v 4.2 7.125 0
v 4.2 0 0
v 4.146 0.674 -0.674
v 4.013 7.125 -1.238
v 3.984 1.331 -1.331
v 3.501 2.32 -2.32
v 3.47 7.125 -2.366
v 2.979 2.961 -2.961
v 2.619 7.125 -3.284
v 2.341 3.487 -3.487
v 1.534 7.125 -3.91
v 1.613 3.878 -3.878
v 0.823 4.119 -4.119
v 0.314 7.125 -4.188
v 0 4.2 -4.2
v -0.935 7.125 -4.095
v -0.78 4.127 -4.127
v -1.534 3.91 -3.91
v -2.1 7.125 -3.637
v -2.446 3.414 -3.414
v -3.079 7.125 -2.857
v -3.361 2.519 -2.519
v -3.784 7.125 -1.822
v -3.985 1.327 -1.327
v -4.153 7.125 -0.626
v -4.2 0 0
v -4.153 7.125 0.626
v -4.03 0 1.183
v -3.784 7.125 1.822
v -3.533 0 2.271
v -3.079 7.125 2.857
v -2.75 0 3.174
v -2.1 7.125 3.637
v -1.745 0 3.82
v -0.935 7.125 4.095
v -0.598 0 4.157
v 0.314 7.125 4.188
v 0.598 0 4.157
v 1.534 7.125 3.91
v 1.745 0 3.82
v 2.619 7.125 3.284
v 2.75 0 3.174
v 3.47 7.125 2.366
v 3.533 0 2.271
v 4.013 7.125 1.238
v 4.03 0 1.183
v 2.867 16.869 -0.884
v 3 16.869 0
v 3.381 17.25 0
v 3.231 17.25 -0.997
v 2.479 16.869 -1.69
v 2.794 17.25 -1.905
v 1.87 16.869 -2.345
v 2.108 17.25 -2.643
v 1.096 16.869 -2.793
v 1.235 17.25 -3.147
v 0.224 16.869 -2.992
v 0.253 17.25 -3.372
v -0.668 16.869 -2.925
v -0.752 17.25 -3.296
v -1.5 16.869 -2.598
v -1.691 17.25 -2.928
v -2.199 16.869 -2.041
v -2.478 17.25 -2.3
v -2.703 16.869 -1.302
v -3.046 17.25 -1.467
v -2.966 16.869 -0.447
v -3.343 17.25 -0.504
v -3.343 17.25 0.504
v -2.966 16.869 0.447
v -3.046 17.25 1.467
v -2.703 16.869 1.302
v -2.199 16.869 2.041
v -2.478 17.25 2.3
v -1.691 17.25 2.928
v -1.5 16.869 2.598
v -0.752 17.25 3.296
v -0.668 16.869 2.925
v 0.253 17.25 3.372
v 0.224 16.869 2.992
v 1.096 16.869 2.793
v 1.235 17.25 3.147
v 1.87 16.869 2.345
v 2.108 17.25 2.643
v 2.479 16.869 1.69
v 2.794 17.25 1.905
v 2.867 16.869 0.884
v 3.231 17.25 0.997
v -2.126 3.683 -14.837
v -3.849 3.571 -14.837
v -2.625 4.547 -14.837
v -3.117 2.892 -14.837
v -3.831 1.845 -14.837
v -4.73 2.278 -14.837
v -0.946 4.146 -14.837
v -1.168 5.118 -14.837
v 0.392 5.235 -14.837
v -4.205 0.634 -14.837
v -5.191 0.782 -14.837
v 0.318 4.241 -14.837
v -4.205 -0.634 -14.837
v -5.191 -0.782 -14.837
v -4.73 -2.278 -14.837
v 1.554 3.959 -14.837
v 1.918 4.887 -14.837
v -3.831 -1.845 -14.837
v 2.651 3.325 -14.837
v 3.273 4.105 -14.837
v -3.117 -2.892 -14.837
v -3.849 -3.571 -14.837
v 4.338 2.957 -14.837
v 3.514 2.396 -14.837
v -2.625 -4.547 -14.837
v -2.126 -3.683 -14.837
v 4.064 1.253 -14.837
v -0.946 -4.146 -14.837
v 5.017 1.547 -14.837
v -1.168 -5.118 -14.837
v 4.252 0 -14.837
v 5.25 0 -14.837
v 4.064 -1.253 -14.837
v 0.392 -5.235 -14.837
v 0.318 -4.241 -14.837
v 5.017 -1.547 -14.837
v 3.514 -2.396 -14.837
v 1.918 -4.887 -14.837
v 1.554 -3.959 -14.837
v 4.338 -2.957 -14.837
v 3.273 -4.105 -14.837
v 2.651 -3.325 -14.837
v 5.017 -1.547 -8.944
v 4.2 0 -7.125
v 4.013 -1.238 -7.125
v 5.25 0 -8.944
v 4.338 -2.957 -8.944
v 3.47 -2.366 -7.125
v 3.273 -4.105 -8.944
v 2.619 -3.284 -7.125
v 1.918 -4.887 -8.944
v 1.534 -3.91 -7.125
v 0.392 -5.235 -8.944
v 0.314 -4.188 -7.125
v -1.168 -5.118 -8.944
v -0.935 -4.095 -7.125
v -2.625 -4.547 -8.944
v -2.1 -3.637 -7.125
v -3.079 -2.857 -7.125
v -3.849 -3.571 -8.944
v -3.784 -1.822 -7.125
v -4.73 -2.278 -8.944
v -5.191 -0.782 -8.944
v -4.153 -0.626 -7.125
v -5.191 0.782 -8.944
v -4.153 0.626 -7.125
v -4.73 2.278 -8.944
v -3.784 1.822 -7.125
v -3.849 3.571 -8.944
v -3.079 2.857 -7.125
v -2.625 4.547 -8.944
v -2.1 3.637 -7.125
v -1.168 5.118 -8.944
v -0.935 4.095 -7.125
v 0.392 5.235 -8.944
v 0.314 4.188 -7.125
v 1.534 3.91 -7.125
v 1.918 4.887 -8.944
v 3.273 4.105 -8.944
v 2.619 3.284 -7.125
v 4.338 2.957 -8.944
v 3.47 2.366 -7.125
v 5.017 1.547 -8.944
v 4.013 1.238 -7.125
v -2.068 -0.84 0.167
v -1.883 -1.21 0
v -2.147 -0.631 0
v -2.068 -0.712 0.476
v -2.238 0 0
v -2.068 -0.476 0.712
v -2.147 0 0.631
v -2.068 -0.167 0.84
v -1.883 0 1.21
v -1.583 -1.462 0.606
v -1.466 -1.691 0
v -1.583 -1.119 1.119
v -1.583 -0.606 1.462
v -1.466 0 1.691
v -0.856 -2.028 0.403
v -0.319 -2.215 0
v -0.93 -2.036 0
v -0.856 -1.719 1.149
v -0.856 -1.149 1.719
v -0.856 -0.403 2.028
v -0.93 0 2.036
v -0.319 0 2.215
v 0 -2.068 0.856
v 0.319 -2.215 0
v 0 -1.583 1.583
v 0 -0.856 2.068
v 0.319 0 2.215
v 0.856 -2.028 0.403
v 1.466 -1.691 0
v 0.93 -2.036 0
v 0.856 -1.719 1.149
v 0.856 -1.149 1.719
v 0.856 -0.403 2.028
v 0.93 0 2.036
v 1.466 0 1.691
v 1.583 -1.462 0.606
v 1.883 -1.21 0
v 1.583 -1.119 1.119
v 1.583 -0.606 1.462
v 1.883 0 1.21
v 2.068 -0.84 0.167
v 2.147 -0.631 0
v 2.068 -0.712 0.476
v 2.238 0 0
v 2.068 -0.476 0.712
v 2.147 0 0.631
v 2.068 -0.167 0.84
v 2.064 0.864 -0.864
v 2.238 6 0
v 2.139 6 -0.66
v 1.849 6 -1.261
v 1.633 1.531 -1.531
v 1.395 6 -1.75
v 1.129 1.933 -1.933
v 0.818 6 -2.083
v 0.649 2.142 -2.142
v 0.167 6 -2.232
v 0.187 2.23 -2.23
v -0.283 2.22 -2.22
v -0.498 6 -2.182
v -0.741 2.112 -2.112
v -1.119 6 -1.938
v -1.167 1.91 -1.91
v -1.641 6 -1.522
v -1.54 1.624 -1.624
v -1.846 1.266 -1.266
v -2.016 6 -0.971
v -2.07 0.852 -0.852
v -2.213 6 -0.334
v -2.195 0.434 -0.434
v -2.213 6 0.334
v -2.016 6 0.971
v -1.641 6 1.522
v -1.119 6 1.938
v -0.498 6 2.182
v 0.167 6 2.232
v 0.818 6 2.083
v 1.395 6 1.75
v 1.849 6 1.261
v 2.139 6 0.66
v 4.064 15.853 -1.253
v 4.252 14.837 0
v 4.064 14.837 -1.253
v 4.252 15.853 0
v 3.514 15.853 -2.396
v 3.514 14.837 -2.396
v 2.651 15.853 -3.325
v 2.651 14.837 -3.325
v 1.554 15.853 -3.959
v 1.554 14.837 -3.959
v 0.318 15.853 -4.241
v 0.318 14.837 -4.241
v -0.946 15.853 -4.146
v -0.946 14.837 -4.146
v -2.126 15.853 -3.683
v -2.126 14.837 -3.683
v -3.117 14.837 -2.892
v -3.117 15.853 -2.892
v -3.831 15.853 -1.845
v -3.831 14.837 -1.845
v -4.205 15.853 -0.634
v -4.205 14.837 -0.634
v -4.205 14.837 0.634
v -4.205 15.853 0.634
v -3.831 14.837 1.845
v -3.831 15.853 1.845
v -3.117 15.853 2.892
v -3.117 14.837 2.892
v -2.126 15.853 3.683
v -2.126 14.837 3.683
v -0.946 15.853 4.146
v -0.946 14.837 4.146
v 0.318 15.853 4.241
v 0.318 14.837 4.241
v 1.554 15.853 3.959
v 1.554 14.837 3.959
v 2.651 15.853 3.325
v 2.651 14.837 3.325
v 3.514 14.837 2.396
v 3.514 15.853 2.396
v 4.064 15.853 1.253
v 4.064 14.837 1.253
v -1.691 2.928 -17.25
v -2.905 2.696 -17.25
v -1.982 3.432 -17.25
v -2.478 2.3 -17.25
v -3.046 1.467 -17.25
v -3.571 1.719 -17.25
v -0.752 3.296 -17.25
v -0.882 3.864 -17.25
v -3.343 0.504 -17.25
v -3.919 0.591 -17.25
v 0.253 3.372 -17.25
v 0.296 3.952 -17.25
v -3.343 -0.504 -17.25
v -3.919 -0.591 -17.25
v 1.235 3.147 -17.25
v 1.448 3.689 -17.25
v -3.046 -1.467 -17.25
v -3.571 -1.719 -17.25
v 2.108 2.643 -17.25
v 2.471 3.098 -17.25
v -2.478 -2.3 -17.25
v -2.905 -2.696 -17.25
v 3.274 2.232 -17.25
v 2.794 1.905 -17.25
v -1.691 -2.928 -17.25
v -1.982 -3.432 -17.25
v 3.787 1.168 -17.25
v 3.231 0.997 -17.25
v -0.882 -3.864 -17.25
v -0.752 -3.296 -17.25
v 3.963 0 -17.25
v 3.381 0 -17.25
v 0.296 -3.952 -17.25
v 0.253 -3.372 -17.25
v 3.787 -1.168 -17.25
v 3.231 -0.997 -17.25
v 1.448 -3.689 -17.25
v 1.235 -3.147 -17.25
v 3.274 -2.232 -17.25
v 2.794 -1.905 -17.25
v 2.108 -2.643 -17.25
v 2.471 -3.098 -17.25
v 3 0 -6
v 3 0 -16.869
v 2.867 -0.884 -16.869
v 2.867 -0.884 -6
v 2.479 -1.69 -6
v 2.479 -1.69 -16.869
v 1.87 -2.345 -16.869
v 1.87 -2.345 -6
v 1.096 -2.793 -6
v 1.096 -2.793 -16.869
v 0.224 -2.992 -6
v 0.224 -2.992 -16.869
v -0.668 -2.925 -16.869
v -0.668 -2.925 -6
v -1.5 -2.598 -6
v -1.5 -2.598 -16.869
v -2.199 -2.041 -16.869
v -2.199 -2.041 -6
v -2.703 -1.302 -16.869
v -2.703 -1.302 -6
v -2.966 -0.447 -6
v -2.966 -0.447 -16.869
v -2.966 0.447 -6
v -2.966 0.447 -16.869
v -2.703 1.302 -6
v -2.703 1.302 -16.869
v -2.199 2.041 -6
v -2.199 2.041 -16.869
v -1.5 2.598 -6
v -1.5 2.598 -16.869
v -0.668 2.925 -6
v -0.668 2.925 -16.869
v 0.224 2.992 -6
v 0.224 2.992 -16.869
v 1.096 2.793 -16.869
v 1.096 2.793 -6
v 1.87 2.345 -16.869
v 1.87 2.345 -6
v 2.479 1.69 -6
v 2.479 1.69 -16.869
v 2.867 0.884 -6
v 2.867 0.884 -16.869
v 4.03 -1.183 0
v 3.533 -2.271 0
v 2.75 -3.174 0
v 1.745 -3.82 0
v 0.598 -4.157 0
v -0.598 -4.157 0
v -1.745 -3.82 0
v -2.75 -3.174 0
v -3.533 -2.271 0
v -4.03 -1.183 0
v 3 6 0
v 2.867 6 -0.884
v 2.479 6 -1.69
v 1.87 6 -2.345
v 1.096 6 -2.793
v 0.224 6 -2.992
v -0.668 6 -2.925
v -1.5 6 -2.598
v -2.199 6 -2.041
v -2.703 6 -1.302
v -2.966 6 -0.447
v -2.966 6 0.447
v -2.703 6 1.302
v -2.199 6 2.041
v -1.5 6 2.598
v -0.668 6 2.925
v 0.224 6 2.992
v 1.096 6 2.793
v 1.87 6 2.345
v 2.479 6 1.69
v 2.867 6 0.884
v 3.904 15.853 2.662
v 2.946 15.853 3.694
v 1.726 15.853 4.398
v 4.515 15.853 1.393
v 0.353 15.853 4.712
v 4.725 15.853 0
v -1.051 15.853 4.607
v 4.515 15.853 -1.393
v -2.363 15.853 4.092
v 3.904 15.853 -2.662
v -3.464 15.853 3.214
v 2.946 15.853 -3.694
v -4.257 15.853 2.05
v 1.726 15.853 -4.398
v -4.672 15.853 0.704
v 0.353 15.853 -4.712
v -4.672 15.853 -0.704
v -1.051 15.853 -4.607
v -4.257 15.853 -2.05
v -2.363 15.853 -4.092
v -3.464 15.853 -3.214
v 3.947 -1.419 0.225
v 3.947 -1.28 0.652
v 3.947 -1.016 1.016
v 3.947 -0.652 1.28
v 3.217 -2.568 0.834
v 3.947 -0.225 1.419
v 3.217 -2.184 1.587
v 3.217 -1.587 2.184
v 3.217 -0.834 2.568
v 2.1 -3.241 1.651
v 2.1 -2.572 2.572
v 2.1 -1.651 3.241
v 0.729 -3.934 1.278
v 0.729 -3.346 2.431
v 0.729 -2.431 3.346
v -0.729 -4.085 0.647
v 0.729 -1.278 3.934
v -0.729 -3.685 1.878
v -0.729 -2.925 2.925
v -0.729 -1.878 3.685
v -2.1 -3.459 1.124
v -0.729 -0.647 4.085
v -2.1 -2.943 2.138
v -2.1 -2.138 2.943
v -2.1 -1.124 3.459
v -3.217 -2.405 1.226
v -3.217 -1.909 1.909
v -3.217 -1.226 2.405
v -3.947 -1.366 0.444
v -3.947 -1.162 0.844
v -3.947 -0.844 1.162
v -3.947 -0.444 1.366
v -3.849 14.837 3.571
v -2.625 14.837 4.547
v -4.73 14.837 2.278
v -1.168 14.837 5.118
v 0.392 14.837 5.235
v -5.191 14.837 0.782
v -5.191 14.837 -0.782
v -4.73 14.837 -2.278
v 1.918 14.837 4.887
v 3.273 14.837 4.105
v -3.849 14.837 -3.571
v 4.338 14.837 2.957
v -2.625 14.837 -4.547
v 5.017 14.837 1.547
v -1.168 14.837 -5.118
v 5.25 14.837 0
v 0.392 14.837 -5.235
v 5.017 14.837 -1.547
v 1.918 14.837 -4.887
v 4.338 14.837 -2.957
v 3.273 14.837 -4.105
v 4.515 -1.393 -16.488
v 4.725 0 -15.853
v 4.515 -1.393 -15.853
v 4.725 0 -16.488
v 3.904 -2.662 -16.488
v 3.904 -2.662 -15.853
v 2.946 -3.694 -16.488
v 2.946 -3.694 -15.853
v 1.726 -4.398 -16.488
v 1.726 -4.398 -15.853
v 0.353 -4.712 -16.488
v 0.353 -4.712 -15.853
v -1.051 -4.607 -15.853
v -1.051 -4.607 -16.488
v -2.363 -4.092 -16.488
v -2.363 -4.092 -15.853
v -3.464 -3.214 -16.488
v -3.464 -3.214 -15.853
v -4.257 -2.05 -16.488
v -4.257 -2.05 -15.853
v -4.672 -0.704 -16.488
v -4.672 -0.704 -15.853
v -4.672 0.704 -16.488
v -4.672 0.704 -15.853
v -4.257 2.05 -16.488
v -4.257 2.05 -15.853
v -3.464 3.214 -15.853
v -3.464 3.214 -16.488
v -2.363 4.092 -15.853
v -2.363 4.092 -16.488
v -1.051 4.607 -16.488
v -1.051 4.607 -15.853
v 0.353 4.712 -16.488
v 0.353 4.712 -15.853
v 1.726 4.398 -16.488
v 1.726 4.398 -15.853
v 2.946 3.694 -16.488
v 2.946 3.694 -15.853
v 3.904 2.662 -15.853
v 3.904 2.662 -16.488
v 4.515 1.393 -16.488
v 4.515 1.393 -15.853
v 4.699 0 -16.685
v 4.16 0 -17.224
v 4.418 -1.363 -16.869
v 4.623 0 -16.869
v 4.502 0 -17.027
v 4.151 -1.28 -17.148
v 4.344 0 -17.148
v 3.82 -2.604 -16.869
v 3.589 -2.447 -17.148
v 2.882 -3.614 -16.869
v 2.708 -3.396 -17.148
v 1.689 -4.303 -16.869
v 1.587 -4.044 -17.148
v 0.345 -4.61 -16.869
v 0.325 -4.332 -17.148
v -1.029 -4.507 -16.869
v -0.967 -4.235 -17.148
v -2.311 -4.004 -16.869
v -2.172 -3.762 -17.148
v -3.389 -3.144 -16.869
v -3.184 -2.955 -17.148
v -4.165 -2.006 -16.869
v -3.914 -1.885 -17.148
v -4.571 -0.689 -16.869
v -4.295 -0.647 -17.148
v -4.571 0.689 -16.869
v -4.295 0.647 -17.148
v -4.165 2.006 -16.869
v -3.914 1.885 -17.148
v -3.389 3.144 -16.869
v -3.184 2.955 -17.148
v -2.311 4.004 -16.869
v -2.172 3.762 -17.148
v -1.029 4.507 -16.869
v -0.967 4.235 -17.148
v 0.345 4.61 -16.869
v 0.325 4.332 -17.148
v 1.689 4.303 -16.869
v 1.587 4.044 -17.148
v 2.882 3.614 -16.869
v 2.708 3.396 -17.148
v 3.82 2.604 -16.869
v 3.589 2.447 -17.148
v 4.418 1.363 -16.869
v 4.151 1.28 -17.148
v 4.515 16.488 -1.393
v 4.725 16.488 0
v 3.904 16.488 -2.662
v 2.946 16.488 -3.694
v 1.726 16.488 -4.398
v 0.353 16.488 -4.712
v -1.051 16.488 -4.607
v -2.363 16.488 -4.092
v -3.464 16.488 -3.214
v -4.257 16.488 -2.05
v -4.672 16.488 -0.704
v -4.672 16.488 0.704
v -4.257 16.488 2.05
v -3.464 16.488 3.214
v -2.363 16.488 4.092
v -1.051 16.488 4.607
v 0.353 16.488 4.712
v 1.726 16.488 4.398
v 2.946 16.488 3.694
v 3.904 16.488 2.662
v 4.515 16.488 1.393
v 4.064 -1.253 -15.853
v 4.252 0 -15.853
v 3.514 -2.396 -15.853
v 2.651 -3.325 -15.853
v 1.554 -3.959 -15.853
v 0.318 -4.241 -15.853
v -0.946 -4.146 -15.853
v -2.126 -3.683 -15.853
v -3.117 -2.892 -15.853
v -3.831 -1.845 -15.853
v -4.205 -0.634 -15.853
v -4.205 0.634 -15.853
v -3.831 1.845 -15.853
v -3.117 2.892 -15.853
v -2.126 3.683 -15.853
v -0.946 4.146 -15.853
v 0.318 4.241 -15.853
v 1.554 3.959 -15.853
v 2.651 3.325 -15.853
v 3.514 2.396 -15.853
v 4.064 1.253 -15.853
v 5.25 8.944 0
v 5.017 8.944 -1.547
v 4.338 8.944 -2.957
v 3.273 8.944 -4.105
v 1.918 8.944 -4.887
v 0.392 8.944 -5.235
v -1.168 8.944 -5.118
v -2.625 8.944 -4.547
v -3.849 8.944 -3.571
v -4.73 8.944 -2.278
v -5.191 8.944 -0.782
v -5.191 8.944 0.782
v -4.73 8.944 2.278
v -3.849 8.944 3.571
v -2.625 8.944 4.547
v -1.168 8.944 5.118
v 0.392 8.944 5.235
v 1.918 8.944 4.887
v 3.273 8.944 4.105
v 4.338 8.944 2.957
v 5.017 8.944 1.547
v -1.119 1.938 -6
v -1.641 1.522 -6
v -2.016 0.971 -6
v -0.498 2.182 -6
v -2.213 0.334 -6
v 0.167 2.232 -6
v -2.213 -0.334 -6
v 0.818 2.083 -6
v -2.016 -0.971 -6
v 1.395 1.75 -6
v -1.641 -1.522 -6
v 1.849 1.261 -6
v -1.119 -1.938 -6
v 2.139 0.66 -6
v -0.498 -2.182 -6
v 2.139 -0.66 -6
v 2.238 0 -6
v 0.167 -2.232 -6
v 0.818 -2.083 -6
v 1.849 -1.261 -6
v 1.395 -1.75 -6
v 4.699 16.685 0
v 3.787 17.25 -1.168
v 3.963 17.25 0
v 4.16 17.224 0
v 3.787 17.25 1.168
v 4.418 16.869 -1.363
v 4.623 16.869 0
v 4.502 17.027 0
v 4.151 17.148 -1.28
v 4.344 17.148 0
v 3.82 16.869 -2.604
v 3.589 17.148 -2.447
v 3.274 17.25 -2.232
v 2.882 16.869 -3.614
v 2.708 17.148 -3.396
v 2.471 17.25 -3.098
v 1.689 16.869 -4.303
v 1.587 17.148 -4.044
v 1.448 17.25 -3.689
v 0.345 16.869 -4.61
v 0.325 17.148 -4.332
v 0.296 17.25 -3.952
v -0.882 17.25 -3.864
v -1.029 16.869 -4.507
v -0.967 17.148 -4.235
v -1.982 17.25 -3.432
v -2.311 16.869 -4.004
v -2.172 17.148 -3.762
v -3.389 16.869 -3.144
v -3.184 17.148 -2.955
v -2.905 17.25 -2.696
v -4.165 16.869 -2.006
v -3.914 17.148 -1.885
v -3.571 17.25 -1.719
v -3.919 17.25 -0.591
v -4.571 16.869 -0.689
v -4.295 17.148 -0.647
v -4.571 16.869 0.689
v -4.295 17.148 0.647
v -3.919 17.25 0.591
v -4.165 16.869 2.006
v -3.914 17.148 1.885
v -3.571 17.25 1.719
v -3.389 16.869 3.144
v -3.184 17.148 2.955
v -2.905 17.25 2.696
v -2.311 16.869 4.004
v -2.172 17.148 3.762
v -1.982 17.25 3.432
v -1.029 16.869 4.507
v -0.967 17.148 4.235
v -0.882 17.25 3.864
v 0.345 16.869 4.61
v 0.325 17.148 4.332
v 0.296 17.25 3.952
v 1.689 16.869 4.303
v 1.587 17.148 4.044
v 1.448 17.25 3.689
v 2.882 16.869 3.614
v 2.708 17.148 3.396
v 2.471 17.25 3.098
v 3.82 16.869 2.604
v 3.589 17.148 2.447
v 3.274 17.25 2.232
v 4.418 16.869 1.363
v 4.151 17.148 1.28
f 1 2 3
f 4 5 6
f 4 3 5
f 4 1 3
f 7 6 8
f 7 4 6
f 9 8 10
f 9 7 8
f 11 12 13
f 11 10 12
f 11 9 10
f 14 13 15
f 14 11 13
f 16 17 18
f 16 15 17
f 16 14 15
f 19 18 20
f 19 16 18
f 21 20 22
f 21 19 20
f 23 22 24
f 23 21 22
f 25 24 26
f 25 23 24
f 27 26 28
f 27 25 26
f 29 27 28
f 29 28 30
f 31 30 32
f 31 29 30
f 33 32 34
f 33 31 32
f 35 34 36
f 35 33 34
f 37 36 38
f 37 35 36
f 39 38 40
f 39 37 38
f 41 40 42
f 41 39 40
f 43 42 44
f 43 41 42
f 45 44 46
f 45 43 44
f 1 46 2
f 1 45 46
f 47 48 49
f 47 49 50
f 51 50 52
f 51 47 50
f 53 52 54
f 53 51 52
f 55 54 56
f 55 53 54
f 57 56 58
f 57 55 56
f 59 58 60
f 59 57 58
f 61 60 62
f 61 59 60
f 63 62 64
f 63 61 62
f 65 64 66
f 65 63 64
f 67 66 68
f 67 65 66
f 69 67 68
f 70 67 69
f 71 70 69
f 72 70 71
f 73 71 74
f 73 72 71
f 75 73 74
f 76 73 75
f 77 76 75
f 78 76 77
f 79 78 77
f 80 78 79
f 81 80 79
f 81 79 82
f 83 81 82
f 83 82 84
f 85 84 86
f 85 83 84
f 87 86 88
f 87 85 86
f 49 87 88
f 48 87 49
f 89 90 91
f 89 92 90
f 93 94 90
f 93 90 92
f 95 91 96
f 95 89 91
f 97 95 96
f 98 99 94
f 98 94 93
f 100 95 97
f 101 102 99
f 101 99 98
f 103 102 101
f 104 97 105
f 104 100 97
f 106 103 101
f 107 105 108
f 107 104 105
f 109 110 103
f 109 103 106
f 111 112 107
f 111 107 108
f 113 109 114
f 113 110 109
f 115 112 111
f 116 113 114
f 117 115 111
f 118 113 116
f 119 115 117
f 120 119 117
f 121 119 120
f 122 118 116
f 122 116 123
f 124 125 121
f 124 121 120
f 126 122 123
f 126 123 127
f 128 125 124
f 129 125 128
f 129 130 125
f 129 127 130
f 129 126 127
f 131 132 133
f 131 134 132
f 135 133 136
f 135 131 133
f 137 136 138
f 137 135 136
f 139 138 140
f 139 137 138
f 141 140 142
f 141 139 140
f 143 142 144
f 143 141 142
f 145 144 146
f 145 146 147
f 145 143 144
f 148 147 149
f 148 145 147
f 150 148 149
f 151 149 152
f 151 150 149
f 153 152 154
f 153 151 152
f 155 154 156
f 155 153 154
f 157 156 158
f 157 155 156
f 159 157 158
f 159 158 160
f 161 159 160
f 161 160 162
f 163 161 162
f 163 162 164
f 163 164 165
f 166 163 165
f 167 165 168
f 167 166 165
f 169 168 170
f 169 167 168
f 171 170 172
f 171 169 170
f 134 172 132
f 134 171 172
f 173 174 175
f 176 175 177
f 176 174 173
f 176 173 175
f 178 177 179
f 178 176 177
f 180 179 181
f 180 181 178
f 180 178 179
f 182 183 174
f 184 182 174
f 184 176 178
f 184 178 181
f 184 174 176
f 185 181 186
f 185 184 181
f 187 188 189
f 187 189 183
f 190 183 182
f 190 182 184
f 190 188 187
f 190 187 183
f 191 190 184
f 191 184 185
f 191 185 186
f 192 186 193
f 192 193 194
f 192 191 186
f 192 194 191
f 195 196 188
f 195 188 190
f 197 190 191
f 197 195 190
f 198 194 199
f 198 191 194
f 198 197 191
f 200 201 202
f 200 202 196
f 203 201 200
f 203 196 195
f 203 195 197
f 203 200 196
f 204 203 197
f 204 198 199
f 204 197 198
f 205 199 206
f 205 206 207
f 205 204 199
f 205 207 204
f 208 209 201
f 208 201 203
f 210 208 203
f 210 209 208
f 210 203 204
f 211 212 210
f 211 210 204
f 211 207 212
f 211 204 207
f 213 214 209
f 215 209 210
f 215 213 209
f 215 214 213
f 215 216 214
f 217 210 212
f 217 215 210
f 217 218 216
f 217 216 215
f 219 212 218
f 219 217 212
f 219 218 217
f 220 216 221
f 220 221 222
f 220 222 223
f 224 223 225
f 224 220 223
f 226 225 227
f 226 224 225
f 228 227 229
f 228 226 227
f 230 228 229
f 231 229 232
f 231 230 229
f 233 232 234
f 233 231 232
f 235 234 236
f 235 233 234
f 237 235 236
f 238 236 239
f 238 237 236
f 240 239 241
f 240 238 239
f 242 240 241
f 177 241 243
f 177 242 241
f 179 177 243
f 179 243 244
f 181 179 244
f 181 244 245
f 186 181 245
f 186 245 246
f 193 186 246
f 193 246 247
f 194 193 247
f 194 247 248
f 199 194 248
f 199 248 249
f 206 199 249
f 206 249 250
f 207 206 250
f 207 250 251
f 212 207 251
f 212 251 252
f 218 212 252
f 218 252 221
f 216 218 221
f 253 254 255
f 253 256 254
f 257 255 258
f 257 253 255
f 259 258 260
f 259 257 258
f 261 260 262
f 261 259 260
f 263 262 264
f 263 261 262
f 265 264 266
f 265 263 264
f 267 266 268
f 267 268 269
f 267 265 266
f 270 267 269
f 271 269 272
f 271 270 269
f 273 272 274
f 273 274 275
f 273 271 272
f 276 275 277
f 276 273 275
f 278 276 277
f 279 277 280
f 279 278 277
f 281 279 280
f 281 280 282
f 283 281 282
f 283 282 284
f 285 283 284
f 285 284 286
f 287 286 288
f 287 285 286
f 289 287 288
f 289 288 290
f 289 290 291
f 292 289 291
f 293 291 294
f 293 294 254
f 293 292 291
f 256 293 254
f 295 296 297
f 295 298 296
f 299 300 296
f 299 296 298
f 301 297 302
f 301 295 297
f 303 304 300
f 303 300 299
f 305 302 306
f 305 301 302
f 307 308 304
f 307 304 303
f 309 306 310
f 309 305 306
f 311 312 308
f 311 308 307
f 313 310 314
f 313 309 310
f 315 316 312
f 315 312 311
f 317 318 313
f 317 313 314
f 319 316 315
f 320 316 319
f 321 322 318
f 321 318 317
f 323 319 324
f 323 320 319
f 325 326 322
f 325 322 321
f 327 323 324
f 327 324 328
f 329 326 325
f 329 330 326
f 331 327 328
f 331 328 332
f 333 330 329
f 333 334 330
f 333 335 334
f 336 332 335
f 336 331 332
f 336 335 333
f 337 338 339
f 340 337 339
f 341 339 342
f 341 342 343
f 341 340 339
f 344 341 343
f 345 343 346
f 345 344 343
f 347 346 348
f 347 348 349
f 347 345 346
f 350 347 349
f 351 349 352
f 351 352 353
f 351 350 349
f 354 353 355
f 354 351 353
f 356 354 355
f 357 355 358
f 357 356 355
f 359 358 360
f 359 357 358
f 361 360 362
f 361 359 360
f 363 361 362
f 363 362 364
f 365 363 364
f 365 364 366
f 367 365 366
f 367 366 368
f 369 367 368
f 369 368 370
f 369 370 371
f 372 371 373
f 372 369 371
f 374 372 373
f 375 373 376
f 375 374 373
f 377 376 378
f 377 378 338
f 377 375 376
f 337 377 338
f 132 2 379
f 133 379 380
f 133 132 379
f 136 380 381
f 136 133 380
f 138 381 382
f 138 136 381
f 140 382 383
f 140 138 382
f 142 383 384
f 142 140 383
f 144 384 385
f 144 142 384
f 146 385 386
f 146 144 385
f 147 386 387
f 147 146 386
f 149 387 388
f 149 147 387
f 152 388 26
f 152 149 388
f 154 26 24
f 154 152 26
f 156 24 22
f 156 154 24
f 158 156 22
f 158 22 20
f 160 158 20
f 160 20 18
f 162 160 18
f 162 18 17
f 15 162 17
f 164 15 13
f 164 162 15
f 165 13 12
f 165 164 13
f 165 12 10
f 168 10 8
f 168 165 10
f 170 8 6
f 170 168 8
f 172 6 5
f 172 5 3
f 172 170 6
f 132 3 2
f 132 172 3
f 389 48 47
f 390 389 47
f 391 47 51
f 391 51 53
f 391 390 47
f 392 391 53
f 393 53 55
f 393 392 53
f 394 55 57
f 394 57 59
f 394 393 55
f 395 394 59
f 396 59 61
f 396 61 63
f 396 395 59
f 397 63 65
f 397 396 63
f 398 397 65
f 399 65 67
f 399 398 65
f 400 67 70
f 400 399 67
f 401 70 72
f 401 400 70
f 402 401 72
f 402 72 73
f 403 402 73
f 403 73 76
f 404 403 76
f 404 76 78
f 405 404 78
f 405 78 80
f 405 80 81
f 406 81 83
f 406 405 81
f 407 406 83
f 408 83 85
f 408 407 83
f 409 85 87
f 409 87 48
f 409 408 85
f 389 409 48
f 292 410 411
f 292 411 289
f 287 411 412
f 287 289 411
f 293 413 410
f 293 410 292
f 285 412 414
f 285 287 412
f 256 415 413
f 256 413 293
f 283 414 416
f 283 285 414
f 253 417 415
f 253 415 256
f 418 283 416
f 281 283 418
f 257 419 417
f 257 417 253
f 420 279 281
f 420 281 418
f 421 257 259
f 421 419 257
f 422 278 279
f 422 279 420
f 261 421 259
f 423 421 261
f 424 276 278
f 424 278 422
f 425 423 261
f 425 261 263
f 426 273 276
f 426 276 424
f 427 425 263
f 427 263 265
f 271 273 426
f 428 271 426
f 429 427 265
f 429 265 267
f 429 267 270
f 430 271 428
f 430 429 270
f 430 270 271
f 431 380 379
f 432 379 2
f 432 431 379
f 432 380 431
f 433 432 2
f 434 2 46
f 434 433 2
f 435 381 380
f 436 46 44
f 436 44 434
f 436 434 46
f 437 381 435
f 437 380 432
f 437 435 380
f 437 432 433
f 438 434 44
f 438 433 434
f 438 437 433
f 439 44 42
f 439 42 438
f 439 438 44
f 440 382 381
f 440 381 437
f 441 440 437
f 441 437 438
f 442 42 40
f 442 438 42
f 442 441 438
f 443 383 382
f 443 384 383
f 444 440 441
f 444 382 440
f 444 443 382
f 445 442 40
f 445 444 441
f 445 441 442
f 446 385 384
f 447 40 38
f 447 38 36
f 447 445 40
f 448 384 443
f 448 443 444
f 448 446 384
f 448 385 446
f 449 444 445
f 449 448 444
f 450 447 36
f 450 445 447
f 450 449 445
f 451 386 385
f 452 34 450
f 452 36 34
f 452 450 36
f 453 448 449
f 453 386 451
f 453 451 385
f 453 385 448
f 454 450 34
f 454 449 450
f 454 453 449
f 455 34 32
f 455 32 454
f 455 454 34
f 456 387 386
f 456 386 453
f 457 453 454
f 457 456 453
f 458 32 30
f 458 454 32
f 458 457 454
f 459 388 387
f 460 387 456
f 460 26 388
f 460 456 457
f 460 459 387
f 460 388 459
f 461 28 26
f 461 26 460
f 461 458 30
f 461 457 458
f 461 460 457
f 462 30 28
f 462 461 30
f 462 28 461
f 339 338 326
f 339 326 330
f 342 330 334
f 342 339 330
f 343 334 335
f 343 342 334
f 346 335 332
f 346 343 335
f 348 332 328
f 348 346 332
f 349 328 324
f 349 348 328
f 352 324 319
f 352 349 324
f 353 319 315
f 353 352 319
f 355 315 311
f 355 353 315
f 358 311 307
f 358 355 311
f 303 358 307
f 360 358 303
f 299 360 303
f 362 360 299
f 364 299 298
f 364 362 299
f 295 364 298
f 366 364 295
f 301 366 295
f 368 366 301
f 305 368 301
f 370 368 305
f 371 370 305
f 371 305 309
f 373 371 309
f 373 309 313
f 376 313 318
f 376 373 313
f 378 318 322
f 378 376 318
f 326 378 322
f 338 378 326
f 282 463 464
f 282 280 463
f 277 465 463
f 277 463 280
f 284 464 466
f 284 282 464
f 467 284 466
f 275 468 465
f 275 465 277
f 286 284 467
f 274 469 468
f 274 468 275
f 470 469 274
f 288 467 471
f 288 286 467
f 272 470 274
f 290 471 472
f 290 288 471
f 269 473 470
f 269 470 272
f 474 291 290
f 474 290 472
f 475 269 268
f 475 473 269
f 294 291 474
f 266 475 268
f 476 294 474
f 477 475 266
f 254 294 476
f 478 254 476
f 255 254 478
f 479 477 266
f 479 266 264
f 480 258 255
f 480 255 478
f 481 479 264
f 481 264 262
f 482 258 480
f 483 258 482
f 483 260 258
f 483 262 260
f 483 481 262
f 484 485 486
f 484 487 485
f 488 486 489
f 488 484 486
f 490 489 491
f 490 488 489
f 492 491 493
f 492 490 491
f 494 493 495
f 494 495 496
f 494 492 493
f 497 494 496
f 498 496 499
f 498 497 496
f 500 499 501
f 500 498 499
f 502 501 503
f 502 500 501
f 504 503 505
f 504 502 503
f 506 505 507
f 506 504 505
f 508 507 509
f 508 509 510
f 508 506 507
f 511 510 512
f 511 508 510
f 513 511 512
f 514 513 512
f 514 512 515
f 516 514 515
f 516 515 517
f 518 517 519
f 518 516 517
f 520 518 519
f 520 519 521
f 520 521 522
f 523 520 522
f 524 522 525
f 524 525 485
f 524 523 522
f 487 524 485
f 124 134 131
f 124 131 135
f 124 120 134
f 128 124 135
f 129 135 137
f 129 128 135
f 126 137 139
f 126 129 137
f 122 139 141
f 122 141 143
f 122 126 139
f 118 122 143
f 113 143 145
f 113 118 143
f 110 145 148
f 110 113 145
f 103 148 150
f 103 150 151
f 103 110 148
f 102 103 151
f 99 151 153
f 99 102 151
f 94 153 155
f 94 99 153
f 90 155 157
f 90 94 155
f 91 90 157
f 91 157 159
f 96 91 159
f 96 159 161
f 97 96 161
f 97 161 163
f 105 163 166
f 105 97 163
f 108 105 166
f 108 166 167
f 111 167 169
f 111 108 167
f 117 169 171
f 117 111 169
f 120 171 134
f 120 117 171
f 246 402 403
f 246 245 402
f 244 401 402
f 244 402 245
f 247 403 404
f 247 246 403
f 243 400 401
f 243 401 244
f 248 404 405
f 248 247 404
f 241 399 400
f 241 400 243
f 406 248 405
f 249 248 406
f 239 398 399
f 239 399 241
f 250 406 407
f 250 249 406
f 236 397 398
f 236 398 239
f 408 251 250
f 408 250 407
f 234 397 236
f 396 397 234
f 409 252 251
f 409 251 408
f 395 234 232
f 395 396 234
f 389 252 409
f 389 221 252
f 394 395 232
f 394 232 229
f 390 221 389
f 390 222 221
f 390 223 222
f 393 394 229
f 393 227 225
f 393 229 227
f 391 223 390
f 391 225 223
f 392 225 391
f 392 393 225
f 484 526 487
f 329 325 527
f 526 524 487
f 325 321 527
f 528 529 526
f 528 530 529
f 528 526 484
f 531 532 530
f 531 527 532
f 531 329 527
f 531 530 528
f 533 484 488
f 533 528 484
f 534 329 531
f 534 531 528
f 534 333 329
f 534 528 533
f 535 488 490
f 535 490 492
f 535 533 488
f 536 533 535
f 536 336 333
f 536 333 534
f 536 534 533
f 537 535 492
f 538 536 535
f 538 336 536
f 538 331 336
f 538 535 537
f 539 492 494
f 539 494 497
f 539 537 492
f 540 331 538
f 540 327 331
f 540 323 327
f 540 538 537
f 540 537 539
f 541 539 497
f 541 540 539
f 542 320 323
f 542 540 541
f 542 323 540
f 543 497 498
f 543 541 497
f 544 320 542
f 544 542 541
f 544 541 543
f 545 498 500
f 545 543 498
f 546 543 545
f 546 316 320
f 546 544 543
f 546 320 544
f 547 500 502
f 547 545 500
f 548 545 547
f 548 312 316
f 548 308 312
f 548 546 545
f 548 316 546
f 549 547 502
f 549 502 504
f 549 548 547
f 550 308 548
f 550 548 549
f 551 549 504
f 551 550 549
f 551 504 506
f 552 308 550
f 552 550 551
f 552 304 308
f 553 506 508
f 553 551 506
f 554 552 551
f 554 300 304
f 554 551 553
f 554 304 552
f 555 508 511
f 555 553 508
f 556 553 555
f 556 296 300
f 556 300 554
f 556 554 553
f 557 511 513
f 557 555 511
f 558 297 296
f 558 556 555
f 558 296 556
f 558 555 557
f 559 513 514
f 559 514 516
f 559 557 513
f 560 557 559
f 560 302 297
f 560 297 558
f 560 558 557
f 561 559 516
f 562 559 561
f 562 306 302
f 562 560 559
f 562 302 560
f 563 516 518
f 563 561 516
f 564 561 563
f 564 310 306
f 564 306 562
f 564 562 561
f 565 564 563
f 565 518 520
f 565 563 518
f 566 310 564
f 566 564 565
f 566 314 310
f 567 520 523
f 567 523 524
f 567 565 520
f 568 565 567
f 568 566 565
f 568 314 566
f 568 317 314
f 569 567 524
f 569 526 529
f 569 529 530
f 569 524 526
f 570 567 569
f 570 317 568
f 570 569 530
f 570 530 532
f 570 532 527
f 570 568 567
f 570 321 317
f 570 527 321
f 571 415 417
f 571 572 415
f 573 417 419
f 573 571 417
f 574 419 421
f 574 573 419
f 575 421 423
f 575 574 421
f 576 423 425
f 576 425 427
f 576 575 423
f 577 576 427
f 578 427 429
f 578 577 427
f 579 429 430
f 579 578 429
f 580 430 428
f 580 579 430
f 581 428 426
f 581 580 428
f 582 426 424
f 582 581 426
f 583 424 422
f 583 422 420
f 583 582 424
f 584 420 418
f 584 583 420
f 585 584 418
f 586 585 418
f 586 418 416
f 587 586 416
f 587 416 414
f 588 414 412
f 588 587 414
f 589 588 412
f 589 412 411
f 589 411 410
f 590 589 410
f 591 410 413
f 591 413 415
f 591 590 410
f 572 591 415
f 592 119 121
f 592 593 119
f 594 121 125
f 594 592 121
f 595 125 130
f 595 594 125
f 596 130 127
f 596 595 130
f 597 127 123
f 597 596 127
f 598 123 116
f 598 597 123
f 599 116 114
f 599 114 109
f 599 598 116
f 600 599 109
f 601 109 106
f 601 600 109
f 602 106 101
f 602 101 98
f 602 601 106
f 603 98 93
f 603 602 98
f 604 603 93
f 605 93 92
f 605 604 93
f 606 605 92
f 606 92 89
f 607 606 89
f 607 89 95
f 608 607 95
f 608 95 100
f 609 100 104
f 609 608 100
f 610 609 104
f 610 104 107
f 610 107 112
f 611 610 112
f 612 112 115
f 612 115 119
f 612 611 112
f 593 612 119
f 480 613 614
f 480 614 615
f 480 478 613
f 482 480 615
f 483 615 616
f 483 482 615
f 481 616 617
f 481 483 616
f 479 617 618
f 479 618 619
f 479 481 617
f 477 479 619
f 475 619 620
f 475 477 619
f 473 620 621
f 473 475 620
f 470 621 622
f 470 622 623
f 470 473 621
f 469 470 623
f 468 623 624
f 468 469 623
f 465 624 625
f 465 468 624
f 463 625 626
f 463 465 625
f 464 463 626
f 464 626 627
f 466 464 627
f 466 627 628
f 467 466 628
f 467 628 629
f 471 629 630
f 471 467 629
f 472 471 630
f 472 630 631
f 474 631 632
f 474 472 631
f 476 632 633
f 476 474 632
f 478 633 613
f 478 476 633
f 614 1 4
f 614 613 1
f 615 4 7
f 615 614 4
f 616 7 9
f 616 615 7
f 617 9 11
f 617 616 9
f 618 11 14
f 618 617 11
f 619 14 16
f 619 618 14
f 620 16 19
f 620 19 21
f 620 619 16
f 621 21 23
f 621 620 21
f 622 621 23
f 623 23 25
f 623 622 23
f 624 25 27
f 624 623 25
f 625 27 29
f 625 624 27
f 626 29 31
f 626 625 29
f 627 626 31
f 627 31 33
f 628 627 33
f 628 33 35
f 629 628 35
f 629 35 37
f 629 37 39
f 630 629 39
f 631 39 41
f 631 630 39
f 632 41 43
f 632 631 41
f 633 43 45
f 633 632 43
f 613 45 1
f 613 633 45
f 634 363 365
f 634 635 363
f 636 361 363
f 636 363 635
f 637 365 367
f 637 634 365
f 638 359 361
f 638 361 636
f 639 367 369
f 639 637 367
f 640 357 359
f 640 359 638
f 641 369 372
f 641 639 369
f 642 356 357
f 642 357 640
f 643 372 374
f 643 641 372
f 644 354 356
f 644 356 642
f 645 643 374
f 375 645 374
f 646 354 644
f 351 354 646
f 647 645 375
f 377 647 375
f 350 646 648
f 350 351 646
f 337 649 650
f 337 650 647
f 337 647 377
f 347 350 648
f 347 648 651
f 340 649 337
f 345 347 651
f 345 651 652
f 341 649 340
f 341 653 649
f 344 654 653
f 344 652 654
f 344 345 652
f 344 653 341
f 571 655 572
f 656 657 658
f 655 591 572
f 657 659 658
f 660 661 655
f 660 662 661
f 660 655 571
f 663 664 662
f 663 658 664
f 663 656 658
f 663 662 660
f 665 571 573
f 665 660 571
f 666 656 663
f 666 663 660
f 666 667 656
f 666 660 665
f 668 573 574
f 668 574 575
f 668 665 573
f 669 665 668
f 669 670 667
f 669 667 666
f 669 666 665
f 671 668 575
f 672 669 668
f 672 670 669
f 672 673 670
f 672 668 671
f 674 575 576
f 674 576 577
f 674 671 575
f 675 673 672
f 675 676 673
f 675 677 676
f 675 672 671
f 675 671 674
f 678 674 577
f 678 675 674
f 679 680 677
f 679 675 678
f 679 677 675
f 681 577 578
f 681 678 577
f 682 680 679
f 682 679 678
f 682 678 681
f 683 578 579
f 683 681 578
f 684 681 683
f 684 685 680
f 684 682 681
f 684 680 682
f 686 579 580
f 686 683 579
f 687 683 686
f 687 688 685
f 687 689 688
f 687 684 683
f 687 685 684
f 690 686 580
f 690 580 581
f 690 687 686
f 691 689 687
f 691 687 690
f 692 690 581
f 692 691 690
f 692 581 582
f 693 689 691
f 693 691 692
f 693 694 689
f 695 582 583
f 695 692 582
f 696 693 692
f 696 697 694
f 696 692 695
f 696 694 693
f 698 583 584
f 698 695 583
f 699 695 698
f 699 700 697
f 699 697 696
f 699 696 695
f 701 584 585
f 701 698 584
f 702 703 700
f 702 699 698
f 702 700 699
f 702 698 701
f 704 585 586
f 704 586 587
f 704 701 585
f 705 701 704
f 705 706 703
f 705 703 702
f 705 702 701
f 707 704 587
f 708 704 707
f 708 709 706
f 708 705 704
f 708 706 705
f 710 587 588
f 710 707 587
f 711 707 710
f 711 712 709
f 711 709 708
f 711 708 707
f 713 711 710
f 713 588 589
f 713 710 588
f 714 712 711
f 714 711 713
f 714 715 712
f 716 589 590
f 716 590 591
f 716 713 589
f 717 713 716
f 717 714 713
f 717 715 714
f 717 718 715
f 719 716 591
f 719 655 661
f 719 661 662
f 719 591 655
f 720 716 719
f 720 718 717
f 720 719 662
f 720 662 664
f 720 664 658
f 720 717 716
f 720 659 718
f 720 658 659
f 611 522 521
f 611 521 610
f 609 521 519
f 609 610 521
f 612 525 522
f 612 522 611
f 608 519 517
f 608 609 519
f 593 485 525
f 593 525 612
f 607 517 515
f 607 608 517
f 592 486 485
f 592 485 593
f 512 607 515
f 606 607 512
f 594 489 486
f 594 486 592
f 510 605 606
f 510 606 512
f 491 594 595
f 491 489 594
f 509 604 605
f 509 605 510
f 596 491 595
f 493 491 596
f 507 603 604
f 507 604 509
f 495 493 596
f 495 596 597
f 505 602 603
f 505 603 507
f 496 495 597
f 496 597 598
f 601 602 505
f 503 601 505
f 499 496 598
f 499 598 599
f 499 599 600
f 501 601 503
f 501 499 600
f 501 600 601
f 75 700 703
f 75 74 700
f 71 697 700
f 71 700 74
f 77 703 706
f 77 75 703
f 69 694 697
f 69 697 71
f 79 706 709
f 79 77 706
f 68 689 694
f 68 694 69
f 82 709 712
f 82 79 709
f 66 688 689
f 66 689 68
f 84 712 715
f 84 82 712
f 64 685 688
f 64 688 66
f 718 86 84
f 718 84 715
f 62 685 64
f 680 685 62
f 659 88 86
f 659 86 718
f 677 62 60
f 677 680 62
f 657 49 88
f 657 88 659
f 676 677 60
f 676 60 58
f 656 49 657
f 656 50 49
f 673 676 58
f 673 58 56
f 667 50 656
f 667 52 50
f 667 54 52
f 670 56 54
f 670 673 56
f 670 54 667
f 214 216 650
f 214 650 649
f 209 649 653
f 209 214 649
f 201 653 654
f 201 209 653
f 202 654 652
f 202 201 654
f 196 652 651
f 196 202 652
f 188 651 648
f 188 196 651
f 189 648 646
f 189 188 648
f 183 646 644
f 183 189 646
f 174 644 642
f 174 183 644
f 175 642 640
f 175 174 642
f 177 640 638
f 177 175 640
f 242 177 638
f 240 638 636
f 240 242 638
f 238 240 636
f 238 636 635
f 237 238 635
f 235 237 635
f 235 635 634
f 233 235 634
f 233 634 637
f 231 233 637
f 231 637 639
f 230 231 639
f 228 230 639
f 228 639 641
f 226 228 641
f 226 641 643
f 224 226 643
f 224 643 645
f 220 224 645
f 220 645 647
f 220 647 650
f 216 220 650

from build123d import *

# Parameters (mm, degrees)
CIRPATTERN1_COUNT = 2
CIRPATTERN1_ANGLE = 90
REVOLVE2_ANGLE    = 90
CIRPATTERN2_COUNT = 2
CIRPATTERN2_ANGLE = 90


with BuildPart() as part:
    # Sketch1 → Revolve1 (revolve)
    with BuildSketch(Plane(origin=(0, 0, 0), x_dir=(0, 0, -1), z_dir=(1, 0, 0)), mode=Mode.PRIVATE) as revolve1_sk:
        with BuildLine():
            Line((15.853, 4.725), (16.488, 4.725))
            ThreePointArc((16.488, 4.725), (17.026815367, 4.501815367), (17.25, 3.963))
            Line((17.25, 3.963), (17.25, 3.381))
            Line((17.25, 3.381), (16.869, 3))
            Line((16.869, 3), (6, 3))
            Line((6, 3), (6, 2.238))
            Line((6, 2.238), (0, 2.238))
            Line((0, 2.238), (0, 4.2))
            Line((0, 4.2), (7.125, 4.2))
            Line((7.125, 4.2), (8.943653348, 5.25))
            Line((8.943653348, 5.25), (14.837, 5.25))
            Line((14.837, 5.25), (14.837, 4.2525))
            Line((14.837, 4.2525), (15.853, 4.2525))
            Line((15.853, 4.2525), (15.853, 4.725))
        make_face()
    revolve(revolve1_sk.sketch.rotate(Axis((0, 0, 0), (0, 0, -1)), 90), axis=Axis((0, 0, 0), (0, 0, -1)))


with BuildPart() as cirpattern1_1:
    # CirPattern1: pattern copy
    add(part.part.rotate(Axis((-5.775, 0, 0), (1, 0, 0)), 1 * CIRPATTERN1_ANGLE / (CIRPATTERN1_COUNT - 1)))


with BuildPart() as part_1:
    add(part.part)

    # Sketch2 → Revolve2 (revolve)
    with BuildSketch(Plane.XY):
        with BuildLine():
            Line((-4.2, 0), (-2.238, 0))
            ThreePointArc((-2.238, 0), (0, -2.238), (2.238, 0))
            Line((2.238, 0), (4.2, 0))
            ThreePointArc((4.2, 0), (0, -4.2), (-4.2, 0))
        make_face()
    revolve(axis=Axis((-4.2, 0, 0), (-1, 0, 0)), revolution_arc=REVOLVE2_ANGLE)

    # Combine1: union CirPattern1_1
    add(cirpattern1_1.part)

    # Sketch3 → Cut-Revolve1 (revolve, cut)
    with BuildSketch(Plane(origin=(0, 0, 0), x_dir=(0, 0, -1), z_dir=(1, 0, 0)), mode=Mode.PRIVATE) as cut_revolve1_sk:
        Polygon((17.25, 3.381), (16.869, 3), (6, 3), (6, 2.238), (0, 2.238), (0, 0), (17.25, 0), align=None)
    cut_revolve1 = revolve(cut_revolve1_sk.sketch.rotate(Axis((0, 0, 0), (0, 0, -1)), 90), axis=Axis((0, 0, 0), (0, 0, -1)), mode=Mode.SUBTRACT)

    # CirPattern2: Cut-Revolve1 ×2 about axis
    cirpattern2_axis = Axis((-5.775, 0, 0), (1, 0, 0))
    for i in range(1, CIRPATTERN2_COUNT):
        add(cut_revolve1.rotate(cirpattern2_axis, i * CIRPATTERN2_ANGLE / (CIRPATTERN2_COUNT - 1)), mode=Mode.SUBTRACT)


solid = part_1.part
